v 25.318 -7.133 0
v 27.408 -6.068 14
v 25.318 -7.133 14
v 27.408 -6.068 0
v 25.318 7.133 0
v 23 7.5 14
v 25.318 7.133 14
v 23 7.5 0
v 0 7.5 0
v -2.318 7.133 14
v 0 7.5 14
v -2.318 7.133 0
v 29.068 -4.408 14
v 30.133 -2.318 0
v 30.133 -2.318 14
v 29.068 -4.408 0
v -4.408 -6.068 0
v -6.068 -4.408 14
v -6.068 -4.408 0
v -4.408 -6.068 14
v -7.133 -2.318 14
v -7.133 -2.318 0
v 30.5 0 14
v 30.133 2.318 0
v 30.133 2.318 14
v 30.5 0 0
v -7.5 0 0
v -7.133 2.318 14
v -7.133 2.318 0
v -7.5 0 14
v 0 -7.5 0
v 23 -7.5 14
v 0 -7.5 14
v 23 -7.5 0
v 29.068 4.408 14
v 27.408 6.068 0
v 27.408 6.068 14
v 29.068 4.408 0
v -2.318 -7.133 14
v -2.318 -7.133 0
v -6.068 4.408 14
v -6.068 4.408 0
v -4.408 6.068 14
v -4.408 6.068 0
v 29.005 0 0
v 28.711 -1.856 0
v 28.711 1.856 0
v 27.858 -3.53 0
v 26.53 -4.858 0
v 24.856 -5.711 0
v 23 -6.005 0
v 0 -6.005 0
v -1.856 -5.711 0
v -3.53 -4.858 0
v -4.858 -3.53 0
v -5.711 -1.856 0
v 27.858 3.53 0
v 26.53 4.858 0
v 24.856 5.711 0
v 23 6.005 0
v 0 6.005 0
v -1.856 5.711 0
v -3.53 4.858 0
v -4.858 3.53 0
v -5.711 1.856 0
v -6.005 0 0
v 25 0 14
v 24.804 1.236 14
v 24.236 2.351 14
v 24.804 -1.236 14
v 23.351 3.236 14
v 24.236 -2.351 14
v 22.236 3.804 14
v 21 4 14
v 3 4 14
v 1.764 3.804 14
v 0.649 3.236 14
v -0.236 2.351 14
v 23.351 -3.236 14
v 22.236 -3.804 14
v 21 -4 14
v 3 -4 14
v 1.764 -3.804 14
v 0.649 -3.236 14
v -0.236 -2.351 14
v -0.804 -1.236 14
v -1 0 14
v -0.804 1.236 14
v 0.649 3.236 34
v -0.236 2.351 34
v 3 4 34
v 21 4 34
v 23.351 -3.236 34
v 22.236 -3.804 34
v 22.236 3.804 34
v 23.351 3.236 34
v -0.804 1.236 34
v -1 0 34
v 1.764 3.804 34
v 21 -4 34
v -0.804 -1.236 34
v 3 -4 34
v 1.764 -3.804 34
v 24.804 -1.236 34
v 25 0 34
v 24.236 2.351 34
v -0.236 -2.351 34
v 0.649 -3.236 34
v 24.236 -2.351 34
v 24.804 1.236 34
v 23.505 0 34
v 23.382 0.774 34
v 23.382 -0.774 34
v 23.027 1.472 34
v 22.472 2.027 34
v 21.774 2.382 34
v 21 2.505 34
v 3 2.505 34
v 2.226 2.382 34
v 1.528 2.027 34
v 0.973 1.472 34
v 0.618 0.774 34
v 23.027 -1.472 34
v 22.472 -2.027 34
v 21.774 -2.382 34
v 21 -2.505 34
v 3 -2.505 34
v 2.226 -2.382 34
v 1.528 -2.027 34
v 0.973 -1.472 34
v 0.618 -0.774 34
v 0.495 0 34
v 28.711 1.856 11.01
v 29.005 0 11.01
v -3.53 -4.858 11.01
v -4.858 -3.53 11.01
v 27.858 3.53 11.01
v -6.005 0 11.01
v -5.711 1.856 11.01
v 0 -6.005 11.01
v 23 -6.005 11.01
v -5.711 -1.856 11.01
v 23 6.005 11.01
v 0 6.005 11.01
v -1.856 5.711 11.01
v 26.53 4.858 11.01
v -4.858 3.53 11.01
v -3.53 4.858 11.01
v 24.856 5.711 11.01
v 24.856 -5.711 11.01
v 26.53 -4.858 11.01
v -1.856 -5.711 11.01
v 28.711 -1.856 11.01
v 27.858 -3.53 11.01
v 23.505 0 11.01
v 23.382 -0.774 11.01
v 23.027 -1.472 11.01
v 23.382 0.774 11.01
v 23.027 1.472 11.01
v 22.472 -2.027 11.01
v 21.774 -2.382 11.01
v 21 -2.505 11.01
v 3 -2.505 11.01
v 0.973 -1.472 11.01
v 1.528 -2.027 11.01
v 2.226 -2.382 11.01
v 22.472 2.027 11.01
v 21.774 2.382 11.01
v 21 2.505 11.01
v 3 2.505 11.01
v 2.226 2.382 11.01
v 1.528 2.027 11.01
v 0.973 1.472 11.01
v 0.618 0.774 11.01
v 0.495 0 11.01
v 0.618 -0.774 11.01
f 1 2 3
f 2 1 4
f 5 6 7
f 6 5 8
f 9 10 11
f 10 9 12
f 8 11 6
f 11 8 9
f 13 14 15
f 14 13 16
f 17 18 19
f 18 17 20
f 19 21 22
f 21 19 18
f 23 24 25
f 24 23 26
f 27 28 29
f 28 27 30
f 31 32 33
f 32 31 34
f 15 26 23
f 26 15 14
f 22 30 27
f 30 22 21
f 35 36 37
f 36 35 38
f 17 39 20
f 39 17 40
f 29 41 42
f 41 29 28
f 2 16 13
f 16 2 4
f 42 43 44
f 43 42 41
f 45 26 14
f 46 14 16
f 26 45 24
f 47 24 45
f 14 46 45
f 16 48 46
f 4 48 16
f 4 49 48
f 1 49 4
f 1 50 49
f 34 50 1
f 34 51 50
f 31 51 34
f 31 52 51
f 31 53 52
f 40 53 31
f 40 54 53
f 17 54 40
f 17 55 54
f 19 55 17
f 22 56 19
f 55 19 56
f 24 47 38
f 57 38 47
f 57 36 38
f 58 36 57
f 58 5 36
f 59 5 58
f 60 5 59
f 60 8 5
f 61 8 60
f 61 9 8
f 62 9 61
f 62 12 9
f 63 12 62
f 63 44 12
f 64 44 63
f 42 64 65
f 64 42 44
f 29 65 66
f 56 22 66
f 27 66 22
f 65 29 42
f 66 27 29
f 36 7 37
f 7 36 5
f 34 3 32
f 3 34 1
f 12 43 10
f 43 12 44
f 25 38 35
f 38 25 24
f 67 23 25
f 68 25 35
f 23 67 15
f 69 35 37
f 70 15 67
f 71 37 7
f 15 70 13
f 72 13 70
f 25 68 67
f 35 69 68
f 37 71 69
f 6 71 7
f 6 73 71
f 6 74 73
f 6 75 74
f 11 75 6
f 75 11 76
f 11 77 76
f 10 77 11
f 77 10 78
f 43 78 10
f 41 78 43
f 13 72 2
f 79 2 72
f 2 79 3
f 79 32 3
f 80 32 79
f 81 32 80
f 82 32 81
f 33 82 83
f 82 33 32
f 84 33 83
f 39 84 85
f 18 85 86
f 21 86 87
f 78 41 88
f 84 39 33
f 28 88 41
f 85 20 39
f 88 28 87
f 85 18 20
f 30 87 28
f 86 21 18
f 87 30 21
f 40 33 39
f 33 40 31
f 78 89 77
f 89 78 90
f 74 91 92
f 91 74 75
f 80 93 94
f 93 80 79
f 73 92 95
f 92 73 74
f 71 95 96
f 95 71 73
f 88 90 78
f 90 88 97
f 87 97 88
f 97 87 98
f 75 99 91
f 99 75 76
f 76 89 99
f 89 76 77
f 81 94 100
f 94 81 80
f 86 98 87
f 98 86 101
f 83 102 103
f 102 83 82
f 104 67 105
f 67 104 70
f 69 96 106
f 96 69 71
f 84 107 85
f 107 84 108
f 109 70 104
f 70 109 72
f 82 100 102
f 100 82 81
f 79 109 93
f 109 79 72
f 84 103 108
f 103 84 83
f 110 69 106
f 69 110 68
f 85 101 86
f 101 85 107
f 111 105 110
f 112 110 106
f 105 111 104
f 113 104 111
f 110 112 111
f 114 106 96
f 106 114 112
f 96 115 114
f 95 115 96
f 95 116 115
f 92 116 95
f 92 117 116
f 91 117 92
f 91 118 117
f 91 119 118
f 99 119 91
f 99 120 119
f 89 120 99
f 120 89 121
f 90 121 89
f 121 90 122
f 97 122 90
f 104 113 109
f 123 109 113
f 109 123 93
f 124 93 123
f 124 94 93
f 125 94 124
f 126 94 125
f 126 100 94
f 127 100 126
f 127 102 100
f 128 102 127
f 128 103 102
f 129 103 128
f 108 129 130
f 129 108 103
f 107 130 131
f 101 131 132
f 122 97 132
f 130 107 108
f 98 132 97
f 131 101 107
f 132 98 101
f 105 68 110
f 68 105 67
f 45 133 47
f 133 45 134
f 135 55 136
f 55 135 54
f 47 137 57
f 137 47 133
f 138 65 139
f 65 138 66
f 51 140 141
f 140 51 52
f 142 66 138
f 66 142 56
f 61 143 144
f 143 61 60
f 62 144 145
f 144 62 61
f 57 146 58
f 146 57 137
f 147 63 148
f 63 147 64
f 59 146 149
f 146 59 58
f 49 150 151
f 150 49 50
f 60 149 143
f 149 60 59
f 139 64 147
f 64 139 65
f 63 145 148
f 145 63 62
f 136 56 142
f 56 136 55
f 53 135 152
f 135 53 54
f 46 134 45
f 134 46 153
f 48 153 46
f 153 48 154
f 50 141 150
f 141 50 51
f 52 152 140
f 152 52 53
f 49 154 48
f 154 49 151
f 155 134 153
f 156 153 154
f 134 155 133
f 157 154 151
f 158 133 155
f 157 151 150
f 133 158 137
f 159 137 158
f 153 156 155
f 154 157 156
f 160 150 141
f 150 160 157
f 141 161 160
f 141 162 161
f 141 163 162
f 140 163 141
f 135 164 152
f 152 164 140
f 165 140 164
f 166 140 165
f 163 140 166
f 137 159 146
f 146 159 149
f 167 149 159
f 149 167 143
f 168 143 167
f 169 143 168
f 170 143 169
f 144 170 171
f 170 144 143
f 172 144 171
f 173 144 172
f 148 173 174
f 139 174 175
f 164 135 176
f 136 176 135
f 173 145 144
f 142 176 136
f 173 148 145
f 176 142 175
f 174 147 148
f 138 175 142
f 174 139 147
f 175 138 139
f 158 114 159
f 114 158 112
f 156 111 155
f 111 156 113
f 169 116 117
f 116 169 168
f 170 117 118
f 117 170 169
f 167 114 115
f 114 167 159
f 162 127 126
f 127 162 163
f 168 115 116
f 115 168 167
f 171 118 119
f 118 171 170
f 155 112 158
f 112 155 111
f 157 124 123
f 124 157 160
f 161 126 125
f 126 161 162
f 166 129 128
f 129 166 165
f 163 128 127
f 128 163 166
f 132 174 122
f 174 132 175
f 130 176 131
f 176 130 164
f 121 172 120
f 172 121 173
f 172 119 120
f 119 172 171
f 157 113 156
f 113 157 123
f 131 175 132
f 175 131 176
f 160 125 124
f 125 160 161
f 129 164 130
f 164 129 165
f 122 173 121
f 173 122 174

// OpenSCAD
$fn=20;
DELTA=0.01;

PHONE_HOLE_WIDTH = 35;
PHONE_HOLE_THICK = 12;

CORD_HOLE_WIDTH = 23;
CORD_HOLE_THICK = 5;

R_SCREW_BOX = 2.5;
W_SCREW_BOX = 22.8;
SCREW_HOLE_DIST = 20;

module rounded_block(length, thick, height)
{
    hull()
    {
        cylinder(r=thick / 2, h = height);
        translate([length - thick, 0, 0])
        {
            cylinder(r=thick / 2, h = height);
        }
    }
}

module arc_wrap(P)
{
    W = CORD_HOLE_WIDTH;
    THICK = CORD_HOLE_THICK;
    HEIGHT = 23;

    translate([(PHONE_HOLE_WIDTH-CORD_HOLE_WIDTH)/4,0,11]) rounded_block(W+P, THICK+P, HEIGHT);
}

module earphone_wrap(P)
{
    W = PHONE_HOLE_WIDTH;
    THICK = PHONE_HOLE_THICK;
    HEIGHT = 11;

    rounded_block(W+P, THICK+P, HEIGHT+P);
}

module holder()
{
    difference()
    {
        union()
        {
            earphone_wrap(3);
            arc_wrap(3);
        }
        union()
        {
            earphone_wrap(DELTA);
            arc_wrap(DELTA);
        }
    }
}
holder();
if(false)
difference()
//union()
{
    union()
    {
        if(true)difference()
        {
            holder();
            translate([21.9,-15/2,11+3]) cube([20,15,40]);
            translate([28,-15/2,0]) cube([20,15,40]);
            translate([21.9,-4,0]) cube([10,8,11+3]);
        }

        translate([0,4,0])
        difference()
        {
            difference()
            {
                union()
                {
                    hull()
                    {
                        cylinder(r=R_SCREW_BOX, h=12);
                        translate([W_SCREW_BOX,0,0])
                        {
                            cylinder(r=R_SCREW_BOX, h=12);
                        }


                    }
                    translate([-R_SCREW_BOX,0,0]) cube([W_SCREW_BOX+R_SCREW_BOX*2, 2, 12]);
                }
                translate([-R_SCREW_BOX,2,0])
                {
                    cube([W_SCREW_BOX+R_SCREW_BOX*2, R_SCREW_BOX * 2,12]);
                }
            }

            translate([1.8,-6+R_SCREW_BOX*2+0.01,12-5]) rotate([90+30,0,0])
            {
                cylinder(r=1.5,h=R_SCREW_BOX*4, center=true);
                translate([0,0,2.1]) cylinder(r=2.5,h=3, center=true);
            }
            translate([1.8+SCREW_HOLE_DIST,-6+R_SCREW_BOX*2+0.01,12-5]) rotate([90+30,0,0])
            {
                cylinder(r=1.5,h=1+R_SCREW_BOX*4, center=true);
                translate([0,0,2.1]) cylinder(r=2.5,h=3, center=true);
            }
        }
    }
    translate([0,4,0])
    {
        translate([1.8,                -6+R_SCREW_BOX*2+0.01,12-5]) rotate([90+30,0,0])
        {
            cylinder(r=1.5,h=R_SCREW_BOX*4, center=true);
            translate([0,0, -4]) cylinder(r=2.5,h=6, center=true);
        }
        translate([1.8+SCREW_HOLE_DIST,-6+R_SCREW_BOX*2+0.01,12-5]) rotate([90+30,0,0])
        {
            cylinder(r=1.5,h=1+R_SCREW_BOX*4, center=true);
            translate([0, 0, -4]) cylinder(r=2.5,h=6, center=true);
        }
    }
}
